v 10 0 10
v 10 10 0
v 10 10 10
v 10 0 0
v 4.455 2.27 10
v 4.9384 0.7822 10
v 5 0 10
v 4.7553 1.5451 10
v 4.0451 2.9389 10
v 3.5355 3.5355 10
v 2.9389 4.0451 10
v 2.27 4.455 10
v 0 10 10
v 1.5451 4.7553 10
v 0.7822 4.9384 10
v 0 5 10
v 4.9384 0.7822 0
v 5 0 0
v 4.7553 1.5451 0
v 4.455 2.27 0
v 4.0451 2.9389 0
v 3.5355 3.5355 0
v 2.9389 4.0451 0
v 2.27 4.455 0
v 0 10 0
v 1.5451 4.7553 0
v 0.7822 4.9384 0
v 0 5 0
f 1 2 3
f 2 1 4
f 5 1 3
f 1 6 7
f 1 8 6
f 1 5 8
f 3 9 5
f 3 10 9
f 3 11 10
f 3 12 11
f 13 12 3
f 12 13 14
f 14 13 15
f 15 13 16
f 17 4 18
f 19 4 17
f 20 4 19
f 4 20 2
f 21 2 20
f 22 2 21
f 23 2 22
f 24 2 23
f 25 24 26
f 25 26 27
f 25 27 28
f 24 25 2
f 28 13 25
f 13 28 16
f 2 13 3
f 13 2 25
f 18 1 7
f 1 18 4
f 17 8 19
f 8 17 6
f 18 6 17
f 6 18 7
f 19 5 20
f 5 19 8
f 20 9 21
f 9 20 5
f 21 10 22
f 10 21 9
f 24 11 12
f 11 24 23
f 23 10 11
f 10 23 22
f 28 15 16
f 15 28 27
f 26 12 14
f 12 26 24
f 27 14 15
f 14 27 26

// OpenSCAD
$fn=40;

difference() {
   cube([10,10,10]);

   cylinder(d=10,h=20);
}
